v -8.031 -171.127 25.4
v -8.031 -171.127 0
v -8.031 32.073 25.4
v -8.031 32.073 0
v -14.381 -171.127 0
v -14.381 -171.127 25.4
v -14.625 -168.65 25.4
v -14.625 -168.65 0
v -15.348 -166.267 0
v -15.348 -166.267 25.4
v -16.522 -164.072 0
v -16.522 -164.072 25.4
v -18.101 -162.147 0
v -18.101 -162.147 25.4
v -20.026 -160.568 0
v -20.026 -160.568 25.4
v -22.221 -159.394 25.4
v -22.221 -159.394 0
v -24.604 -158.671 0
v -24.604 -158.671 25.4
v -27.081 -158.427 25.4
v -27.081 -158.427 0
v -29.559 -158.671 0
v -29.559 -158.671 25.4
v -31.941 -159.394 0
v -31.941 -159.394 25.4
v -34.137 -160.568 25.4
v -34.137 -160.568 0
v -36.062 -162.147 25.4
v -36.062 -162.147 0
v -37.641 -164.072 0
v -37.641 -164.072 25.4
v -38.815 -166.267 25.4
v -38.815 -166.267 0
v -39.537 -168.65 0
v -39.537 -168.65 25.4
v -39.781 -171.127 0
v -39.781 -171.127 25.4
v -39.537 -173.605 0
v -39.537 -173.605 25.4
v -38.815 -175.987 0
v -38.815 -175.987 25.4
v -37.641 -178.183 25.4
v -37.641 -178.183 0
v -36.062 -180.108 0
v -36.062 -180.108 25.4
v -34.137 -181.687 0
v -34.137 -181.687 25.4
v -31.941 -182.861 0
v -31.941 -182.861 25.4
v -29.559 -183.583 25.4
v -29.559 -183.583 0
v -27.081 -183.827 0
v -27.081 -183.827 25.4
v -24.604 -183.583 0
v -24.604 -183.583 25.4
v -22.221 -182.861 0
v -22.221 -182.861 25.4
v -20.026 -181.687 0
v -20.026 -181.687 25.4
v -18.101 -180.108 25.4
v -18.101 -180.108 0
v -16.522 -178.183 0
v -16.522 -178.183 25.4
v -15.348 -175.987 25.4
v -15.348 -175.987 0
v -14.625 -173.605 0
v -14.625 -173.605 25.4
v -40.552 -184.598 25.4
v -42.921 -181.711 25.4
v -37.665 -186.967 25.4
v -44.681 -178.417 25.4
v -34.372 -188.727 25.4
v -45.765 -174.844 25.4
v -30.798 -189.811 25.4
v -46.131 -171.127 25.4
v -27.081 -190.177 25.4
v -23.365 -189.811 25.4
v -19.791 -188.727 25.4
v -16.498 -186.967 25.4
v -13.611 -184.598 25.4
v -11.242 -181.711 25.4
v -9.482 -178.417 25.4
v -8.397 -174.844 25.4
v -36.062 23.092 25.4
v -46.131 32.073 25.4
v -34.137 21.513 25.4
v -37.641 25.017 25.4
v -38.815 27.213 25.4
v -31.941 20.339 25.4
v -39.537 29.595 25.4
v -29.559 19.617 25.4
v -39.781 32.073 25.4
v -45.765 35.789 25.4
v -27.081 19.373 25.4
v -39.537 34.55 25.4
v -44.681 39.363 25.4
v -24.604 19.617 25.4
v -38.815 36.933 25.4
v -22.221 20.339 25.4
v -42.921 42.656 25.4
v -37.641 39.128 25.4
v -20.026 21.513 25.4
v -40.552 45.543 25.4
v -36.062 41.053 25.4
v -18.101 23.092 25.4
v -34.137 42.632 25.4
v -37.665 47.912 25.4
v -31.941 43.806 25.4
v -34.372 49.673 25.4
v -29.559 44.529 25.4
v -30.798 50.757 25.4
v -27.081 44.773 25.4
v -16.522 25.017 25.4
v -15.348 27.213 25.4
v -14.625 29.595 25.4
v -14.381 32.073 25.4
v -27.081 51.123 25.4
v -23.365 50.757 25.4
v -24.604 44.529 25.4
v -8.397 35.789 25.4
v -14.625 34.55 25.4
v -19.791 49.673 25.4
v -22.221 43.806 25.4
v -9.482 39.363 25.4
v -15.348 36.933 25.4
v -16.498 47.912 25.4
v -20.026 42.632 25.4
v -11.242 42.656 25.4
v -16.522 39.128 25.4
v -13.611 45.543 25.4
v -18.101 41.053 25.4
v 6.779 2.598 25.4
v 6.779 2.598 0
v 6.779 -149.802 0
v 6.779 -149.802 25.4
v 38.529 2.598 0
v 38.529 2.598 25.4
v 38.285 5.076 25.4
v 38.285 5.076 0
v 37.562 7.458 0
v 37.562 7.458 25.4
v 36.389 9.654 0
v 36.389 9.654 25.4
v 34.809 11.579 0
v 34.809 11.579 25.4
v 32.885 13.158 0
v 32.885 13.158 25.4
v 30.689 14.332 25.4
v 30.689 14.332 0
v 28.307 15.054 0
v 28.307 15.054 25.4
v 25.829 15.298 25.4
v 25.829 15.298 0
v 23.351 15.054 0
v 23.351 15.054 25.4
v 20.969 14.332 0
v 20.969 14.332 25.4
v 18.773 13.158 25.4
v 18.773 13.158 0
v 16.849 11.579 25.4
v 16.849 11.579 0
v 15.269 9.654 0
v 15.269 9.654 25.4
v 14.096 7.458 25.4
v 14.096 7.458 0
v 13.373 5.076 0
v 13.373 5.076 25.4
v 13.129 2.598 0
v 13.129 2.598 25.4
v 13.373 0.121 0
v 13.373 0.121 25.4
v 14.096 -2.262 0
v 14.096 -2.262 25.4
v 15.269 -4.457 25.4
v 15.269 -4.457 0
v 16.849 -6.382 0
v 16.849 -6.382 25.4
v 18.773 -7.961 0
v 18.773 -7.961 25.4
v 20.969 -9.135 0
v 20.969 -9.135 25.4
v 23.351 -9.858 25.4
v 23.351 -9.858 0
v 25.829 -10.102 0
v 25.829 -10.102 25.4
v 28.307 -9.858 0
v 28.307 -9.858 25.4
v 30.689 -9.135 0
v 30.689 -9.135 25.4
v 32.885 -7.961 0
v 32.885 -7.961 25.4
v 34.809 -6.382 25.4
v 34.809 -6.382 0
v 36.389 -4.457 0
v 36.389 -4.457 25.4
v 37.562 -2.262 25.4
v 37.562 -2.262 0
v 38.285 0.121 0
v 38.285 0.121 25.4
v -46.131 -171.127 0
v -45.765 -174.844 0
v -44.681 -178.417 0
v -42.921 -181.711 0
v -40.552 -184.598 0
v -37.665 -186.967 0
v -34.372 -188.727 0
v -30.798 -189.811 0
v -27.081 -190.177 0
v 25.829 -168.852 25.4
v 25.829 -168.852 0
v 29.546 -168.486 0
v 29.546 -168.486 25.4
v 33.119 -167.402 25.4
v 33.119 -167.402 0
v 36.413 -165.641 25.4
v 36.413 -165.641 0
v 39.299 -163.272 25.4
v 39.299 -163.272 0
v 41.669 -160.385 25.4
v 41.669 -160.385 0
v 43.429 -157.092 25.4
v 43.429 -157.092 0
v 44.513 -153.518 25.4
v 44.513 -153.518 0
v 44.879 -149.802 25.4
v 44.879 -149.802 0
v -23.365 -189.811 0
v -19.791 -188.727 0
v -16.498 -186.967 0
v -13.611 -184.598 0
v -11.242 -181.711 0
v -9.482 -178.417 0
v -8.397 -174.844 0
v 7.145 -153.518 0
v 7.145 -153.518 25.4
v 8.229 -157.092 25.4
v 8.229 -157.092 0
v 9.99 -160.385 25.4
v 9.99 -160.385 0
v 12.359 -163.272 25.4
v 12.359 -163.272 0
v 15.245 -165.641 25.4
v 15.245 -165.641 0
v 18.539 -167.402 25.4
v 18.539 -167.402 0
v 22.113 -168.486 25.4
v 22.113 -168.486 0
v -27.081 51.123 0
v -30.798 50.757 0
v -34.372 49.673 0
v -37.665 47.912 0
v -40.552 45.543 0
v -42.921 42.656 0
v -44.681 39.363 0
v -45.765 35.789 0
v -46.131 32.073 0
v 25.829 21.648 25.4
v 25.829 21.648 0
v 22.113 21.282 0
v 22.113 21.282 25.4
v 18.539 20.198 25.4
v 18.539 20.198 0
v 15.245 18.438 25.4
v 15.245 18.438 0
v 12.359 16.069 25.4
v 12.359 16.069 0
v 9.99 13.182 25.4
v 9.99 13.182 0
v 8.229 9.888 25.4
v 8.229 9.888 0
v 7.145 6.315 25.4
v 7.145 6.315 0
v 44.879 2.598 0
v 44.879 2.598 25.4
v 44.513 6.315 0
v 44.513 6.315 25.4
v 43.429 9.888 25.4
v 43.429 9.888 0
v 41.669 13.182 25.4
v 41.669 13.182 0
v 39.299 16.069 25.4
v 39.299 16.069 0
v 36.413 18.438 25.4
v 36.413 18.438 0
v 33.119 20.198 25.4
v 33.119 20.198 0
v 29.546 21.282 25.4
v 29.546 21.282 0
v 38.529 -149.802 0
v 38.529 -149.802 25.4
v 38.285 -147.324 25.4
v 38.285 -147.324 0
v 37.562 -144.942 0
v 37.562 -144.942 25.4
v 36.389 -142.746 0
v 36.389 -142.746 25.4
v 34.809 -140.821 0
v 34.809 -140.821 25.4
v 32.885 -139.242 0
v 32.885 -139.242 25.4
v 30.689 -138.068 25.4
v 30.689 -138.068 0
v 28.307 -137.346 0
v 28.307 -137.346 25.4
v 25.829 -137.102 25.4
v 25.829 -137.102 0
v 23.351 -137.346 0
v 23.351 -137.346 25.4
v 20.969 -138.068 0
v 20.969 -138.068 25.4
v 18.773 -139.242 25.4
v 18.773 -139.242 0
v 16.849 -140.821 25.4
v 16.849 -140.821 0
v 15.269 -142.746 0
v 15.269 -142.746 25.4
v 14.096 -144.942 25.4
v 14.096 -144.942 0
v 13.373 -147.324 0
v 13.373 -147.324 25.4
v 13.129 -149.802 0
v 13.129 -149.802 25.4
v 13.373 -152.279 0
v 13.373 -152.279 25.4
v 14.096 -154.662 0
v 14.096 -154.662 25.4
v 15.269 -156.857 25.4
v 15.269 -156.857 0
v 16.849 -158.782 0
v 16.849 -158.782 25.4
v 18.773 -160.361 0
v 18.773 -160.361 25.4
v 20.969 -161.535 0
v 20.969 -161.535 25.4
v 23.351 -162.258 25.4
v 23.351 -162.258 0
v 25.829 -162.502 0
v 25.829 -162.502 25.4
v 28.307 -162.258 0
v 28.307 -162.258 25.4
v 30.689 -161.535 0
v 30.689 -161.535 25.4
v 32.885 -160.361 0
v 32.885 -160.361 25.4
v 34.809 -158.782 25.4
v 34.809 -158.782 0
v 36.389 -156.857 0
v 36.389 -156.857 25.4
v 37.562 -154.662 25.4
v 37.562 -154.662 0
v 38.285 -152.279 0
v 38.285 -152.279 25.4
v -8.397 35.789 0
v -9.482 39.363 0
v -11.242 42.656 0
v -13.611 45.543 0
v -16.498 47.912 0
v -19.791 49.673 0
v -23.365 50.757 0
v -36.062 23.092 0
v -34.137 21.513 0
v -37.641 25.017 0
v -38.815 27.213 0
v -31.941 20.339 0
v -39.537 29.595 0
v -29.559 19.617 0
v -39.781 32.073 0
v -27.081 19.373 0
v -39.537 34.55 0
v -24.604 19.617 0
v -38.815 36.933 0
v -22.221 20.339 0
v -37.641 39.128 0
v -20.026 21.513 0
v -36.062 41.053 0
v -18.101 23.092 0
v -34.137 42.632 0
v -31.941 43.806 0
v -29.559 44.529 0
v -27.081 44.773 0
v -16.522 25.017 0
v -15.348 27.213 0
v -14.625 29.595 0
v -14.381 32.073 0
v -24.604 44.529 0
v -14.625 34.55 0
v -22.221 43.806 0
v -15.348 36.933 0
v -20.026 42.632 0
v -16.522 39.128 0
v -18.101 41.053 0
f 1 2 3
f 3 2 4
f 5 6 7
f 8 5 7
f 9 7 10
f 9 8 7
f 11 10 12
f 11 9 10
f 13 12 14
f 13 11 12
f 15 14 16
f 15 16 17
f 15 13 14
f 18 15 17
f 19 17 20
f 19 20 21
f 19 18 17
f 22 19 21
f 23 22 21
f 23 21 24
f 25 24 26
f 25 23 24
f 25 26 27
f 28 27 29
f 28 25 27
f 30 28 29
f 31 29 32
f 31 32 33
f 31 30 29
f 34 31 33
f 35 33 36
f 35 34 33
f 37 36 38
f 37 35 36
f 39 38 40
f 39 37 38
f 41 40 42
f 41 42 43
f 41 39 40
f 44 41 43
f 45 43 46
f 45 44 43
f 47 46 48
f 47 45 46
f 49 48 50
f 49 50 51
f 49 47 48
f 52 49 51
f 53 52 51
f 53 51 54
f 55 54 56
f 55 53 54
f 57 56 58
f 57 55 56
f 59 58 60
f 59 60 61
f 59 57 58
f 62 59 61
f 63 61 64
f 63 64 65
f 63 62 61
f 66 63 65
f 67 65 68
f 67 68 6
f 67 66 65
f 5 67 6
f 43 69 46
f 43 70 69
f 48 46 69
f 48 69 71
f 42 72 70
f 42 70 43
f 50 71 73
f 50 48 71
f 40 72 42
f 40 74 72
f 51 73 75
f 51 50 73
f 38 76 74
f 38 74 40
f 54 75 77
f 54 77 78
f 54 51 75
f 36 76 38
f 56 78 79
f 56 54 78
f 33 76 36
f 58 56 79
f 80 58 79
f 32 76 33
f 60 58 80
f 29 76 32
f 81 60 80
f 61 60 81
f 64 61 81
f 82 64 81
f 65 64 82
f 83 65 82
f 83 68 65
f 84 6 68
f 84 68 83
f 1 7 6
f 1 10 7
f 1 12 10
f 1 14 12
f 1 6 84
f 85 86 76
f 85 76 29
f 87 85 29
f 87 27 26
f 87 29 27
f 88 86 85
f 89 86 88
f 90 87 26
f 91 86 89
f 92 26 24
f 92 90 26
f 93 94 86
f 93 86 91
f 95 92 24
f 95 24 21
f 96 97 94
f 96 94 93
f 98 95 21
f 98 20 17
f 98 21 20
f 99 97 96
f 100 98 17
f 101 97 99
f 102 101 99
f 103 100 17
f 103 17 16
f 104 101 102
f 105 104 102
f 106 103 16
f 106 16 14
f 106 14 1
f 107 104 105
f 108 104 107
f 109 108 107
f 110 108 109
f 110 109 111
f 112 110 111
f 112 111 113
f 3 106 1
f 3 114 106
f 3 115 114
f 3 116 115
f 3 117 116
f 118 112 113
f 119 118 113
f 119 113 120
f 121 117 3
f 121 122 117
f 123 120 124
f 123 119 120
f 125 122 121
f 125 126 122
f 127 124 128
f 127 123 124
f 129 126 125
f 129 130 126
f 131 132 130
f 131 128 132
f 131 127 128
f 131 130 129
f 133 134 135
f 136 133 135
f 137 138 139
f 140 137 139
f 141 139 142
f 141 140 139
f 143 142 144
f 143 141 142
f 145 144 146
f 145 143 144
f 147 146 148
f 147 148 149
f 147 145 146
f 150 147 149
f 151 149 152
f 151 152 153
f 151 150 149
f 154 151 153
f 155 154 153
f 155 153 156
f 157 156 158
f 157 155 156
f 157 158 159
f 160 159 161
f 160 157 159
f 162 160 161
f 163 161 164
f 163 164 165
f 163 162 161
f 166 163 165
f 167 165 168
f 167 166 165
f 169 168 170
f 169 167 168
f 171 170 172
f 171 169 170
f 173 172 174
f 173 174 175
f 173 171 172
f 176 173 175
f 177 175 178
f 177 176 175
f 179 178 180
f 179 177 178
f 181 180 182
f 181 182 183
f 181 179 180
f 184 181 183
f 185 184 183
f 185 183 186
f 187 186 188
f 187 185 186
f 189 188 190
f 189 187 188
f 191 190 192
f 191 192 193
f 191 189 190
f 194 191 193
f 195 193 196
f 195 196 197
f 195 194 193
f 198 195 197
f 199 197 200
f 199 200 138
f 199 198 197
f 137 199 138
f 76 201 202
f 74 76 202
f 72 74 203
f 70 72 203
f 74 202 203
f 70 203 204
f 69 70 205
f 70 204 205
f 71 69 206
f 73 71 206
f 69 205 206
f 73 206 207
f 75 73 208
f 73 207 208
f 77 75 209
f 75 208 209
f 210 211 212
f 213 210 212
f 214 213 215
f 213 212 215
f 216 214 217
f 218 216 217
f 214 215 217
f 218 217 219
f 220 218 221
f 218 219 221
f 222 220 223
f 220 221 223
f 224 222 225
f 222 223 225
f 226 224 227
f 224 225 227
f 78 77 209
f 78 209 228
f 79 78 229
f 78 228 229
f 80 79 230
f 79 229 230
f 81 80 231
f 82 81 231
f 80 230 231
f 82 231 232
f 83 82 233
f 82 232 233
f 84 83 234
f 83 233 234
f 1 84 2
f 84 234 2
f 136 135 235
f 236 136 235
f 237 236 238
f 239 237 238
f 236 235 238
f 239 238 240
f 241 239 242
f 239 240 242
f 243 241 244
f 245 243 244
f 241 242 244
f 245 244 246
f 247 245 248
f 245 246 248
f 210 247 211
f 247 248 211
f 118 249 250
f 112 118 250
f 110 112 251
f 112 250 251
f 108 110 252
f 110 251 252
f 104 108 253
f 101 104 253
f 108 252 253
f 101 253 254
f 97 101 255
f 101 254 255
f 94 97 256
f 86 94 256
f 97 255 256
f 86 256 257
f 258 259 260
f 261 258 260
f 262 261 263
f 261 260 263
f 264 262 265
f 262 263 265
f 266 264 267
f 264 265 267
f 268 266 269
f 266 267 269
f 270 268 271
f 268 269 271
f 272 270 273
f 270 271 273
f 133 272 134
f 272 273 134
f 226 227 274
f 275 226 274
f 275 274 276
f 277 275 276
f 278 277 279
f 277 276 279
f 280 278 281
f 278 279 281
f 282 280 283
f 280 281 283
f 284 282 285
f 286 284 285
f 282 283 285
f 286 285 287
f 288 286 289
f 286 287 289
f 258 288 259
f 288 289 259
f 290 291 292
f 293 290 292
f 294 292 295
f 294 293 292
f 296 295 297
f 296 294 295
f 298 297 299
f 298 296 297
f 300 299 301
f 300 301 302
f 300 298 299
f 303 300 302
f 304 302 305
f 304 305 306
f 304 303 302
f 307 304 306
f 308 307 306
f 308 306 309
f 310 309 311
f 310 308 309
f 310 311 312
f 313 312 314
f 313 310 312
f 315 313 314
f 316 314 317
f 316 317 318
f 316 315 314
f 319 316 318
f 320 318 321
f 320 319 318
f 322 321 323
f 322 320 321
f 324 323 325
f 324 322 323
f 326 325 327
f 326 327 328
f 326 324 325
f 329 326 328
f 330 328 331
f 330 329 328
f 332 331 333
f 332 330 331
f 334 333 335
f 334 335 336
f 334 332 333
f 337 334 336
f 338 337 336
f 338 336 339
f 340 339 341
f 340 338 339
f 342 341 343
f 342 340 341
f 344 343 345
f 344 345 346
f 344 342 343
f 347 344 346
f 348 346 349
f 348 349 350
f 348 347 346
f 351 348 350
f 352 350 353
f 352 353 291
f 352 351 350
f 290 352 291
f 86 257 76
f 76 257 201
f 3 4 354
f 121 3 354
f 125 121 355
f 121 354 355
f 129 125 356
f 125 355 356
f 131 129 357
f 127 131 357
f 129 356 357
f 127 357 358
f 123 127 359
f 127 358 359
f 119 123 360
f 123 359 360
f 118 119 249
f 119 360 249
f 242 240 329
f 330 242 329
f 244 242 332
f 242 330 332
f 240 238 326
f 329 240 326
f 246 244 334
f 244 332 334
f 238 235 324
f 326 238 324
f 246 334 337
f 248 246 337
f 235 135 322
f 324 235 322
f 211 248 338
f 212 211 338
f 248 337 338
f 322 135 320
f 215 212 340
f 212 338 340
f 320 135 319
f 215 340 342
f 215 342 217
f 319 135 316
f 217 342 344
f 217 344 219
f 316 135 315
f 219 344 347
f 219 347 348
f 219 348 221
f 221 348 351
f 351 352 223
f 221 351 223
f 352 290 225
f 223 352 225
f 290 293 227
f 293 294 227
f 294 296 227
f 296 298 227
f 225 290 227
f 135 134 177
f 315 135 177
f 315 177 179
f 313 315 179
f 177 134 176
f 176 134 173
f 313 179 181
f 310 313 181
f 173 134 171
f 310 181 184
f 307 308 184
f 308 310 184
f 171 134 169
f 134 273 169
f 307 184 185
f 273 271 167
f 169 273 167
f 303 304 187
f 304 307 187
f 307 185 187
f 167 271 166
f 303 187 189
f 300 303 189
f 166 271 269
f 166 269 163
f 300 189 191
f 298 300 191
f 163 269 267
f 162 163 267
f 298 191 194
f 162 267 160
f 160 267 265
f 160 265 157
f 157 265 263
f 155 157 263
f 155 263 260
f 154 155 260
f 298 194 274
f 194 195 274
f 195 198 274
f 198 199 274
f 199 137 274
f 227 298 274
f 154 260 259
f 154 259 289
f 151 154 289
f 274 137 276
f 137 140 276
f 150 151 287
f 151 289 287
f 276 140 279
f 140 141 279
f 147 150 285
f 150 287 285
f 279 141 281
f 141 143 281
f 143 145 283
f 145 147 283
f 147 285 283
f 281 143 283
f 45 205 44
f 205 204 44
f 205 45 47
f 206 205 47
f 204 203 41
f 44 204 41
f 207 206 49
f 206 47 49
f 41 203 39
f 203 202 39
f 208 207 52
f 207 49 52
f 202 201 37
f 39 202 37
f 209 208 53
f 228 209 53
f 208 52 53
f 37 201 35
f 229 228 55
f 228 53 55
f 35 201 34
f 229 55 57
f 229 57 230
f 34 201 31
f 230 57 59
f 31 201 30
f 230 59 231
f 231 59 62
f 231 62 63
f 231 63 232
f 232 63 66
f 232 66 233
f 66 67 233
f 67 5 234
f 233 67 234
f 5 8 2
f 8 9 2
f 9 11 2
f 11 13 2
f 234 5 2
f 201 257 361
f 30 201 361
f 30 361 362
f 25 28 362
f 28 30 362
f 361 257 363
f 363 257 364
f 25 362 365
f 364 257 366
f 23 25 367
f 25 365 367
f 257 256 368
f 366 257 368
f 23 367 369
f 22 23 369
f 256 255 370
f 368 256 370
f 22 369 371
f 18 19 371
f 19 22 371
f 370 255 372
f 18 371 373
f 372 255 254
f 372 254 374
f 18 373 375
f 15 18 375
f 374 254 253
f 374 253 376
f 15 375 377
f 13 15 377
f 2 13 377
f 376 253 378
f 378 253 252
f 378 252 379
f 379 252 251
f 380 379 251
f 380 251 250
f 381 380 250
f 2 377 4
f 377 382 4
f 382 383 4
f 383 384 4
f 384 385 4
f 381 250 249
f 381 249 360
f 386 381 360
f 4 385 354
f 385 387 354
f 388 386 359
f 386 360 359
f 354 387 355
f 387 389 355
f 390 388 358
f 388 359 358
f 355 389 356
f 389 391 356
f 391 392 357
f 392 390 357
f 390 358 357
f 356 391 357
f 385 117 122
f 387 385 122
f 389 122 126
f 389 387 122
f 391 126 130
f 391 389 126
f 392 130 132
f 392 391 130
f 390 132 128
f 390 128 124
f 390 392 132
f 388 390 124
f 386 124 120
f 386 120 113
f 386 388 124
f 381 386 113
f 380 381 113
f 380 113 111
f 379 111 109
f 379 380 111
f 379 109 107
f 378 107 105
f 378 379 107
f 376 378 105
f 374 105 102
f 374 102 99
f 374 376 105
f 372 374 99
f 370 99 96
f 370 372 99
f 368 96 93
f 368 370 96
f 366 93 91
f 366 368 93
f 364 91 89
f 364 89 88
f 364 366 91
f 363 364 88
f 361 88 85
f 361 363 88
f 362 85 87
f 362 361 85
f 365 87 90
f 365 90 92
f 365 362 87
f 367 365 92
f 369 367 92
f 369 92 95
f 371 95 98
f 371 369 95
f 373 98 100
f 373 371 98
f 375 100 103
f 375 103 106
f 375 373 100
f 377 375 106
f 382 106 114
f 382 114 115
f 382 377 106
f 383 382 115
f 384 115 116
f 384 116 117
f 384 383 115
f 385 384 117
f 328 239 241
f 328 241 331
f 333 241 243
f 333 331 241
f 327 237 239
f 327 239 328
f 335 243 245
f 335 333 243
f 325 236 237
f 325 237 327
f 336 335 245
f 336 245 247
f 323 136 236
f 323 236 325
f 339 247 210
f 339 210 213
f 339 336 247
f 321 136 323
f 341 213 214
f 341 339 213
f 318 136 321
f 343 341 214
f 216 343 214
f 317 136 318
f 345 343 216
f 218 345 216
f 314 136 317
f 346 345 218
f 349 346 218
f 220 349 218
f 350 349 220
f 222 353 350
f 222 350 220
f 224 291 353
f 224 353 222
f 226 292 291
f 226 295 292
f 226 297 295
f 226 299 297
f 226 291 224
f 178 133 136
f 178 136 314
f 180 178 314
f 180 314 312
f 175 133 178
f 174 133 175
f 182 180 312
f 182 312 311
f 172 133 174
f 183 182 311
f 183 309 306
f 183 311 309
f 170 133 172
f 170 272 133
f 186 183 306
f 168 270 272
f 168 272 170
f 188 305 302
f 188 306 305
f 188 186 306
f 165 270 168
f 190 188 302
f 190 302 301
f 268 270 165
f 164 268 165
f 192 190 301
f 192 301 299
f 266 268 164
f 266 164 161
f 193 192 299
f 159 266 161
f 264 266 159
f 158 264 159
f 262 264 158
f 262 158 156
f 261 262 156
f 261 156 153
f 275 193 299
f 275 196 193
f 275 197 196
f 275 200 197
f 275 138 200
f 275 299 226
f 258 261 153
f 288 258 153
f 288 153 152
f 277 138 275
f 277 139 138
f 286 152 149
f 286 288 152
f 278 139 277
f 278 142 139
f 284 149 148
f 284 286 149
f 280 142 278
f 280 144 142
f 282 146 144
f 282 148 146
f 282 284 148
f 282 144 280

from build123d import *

# Parameters (mm, degrees)
F0_R     = 12.7
F1_DEPTH = 25.4
F2_DEPTH = 25.4


with BuildPart() as f1:
    # F0 (on Top) → F1 (new body)
    with BuildSketch(Plane.XY):
        with BuildLine():
            ThreePointArc((-27.081409, 51.122649), (-40.551793, 45.543033), (-46.131409, 32.072649))
            Line((-46.131409, 32.072649), (-46.131409, -171.127351))
            ThreePointArc((-46.131409, -171.127351), (-40.551793, -184.597735), (-27.081409, -190.177351))
            ThreePointArc((-27.081409, -190.177351), (-13.611025, -184.597735), (-8.031409, -171.127351))
            Line((-8.031409, -171.127351), (-8.031409, 32.072649))
            ThreePointArc((-8.031409, 32.072649), (-13.611025, 45.543033), (-27.081409, 51.122649))
        make_face()
        with Locations((-27.081409, -171.127351)):
            Circle(F0_R, mode=Mode.SUBTRACT)
        with Locations((-27.081409, 32.072649)):
            Circle(F0_R, mode=Mode.SUBTRACT)
    extrude(amount=F1_DEPTH)


with BuildPart() as f2:
    # F0 (on Top) → F2 (new body)
    with BuildSketch(Plane.XY):
        with BuildLine():
            ThreePointArc((25.829059, 21.648322), (12.358675, 16.068706), (6.779059, 2.598322))
            Line((6.779059, 2.598322), (6.779059, -149.801678))
            ThreePointArc((6.779059, -149.801678), (12.358675, -163.272062), (25.829059, -168.851678))
            ThreePointArc((25.829059, -168.851678), (39.299443, -163.272062), (44.879059, -149.801678))
            Line((44.879059, -149.801678), (44.879059, 2.598322))
            ThreePointArc((44.879059, 2.598322), (39.299443, 16.068706), (25.829059, 21.648322))
        make_face()
        with Locations((25.829059, -149.801678)):
            Circle(F0_R, mode=Mode.SUBTRACT)
        with Locations((25.829059, 2.598322)):
            Circle(F0_R, mode=Mode.SUBTRACT)
    extrude(amount=F2_DEPTH)


solid = Compound([f1.part, f2.part])
